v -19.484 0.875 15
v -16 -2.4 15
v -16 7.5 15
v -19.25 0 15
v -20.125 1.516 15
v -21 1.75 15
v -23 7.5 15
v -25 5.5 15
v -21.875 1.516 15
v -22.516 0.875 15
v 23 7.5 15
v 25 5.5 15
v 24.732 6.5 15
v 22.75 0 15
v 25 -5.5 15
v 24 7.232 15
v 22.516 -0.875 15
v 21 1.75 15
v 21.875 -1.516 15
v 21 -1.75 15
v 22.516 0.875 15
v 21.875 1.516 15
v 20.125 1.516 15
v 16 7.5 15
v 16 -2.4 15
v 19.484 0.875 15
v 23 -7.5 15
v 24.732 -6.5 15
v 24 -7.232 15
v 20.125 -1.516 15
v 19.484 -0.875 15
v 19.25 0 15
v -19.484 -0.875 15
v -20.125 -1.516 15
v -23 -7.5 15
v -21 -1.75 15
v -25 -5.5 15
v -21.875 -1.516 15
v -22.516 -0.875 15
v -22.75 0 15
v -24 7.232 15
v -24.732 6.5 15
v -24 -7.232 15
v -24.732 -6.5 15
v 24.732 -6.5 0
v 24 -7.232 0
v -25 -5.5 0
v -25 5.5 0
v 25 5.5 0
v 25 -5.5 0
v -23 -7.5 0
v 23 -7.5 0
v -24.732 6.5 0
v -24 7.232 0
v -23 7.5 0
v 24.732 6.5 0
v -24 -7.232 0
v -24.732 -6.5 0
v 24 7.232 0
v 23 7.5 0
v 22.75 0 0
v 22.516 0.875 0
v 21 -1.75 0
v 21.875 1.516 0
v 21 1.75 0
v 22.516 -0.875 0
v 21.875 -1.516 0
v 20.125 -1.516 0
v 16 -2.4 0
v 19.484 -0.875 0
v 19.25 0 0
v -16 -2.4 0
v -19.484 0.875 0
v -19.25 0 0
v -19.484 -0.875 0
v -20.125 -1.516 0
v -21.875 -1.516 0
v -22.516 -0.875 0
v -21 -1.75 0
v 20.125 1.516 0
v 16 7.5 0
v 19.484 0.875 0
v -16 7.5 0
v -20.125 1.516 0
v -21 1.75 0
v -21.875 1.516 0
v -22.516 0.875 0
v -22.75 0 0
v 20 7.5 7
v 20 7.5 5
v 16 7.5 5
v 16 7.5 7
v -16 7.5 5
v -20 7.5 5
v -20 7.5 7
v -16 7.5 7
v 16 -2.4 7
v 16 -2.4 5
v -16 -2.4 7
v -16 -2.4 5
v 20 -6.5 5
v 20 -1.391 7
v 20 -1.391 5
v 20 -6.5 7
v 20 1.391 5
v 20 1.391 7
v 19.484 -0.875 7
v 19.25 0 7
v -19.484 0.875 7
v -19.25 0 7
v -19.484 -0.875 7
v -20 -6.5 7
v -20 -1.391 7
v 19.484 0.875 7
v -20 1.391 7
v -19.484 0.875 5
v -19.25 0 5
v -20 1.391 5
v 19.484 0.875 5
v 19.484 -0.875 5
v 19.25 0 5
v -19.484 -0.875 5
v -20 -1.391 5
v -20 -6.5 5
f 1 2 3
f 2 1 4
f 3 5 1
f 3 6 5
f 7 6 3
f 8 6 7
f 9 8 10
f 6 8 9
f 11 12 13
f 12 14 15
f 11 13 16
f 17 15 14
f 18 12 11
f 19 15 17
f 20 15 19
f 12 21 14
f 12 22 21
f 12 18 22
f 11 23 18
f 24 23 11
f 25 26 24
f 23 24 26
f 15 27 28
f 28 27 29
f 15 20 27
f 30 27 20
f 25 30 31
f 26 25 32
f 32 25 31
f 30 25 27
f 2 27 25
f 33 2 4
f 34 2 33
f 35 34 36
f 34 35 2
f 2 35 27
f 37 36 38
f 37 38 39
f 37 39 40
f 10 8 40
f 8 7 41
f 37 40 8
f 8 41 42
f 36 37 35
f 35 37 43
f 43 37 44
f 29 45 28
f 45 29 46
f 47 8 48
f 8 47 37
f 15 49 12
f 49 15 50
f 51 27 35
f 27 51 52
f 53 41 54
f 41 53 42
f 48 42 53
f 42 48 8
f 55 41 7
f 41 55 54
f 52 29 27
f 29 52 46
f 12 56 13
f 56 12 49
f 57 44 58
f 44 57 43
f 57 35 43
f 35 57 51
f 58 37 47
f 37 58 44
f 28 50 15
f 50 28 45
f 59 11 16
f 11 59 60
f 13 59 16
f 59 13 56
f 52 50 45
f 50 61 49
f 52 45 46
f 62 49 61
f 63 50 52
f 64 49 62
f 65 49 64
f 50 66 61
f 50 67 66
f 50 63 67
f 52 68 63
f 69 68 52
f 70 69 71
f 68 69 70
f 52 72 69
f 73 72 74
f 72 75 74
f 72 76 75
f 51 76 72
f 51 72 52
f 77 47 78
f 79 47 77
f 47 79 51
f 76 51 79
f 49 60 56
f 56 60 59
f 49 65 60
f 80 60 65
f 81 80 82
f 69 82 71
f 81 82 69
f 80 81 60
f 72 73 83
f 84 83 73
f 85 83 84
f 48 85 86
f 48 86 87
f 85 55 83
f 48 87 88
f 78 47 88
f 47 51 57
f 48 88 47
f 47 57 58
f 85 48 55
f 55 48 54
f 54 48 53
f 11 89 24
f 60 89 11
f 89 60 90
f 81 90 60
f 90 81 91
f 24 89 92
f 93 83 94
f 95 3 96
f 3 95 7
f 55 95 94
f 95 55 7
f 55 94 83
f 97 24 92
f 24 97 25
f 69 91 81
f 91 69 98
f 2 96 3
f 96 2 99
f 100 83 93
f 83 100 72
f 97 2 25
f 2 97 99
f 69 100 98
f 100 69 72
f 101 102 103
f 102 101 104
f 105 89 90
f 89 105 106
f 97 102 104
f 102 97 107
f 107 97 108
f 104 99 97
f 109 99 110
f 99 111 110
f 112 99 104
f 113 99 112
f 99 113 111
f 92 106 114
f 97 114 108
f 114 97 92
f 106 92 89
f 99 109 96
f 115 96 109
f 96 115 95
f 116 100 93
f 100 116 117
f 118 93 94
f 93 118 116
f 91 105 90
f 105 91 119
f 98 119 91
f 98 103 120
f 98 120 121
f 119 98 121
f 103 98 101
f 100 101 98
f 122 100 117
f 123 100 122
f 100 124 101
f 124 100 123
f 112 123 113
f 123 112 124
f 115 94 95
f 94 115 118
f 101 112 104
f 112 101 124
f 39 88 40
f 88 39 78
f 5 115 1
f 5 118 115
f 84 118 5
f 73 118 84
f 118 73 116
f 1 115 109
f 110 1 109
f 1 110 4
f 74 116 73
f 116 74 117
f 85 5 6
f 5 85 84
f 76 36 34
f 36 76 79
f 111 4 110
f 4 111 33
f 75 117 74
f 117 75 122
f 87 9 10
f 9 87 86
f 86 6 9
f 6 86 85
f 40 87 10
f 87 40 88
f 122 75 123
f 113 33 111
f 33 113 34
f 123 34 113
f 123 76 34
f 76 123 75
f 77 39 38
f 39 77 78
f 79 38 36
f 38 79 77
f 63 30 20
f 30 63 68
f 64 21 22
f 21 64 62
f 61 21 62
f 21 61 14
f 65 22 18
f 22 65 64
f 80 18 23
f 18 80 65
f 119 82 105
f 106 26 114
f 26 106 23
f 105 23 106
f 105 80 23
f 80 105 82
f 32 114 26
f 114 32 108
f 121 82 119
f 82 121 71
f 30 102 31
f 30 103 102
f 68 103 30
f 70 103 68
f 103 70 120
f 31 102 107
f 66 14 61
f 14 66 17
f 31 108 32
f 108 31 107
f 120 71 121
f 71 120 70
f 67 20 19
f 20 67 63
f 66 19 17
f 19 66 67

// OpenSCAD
// file: ../OpenSCAD_Modules/cube_vround.scad
module cube_vround(
	size=[10,10,10],
	round_corners=[true,true,true,true],
	rounding=3,
	center_xy=false,
	center_z=false,
	attach=0,
	wall_attach=0,
	quality=2, //integer from 1 to infinity
)
{
	assert(len(size)==3);
	assert(len(round_corners)==4);
	assert(rounding>0);
	assert(rounding<=size[0]/2);
	assert(rounding<=size[1]/2);
	assert(quality>0);
	assert(attach>=0);
	assert(wall_attach>=0);
	height=size[2]+attach;
	cyl_r=rounding+wall_attach;
	cyl_mvx=size[0]/2-rounding;
	cyl_mvy=size[1]/2-rounding;
	cube_szx=size[0]/2;
	cube_szy=size[1]/2;
	cube_mvx=cube_szx/2+wall_attach;
	cube_mvy=cube_szy/2+wall_attach;
	translate([center_xy?0:cube_szx,center_xy?0:cube_szy,center_z?-attach/2:(size[2]-attach)/2])
		hull()
		{
			if(round_corners[0])
				translate([cyl_mvx,cyl_mvy])
					cylinder(r=cyl_r,h=height,$fn=12*quality,center=true);
			else
				translate([cube_mvx,cube_mvy])
					cube([cube_szx,cube_szy,height],center=true);
			if(round_corners[1])
				translate([cyl_mvx,-cyl_mvy])
					cylinder(r=cyl_r,h=height,$fn=12*quality,center=true);
			else
				translate([cube_mvx,-cube_mvy])
					cube([cube_szx,cube_szy,height],center=true);
			if(round_corners[2])
				translate([-cyl_mvx,-cyl_mvy])
					cylinder(r=cyl_r,h=height,$fn=12*quality,center=true);
			else
				translate([-cube_mvx,-cube_mvy])
					cube([cube_szx,cube_szy,height],center=true);
			if(round_corners[3])
				translate([-cyl_mvx,cyl_mvy])
					cylinder(r=cyl_r,h=height,$fn=12*quality,center=true);
			else
				translate([-cube_mvx,cube_mvy])
					cube([cube_szx,cube_szy,height],center=true);
		};
}

//example
cube_vround(round_corners=[true,false,true,false],
size=[10,20,6],
attach=0.1,
wall_attach=0.1,
rounding=3,
center_xy=true,center_z=false);
// main file
use <../OpenSCAD_Modules/cube_vround.scad>

module PowerClipsHolder
(
	size=[50,15,15],
	cutSize=[32,10],
	clipSize=[4,2],
	clipShift=8,
	screwDiam=3.5,
	screwDiff=42,
	quality=1,
)
{
	cutClr=0.1;
	length=size[0];
	width=size[1];
	height=size[2];
	difference()
	{
		cube_vround(size=[length,width,height],rounding=2,center_xy=true,quality=quality);
		//main cut
		translate([-cutSize[0]/2,(width-2*cutSize[1])/2+cutClr,-cutClr])
			cube(size=[cutSize[0],cutSize[1]+cutClr,height+2*cutClr]);
		//rear cut
		translate([-cutSize[0]/2-clipSize[0],(width-2*cutSize[1])/2-clipSize[0],height-clipSize[1]-clipShift])
			cube(size=[cutSize[0]+clipSize[0]*2,cutSize[1]+clipSize[0]+cutClr,clipSize[1]]);
		//screw cuts
		translate([-screwDiff/2,0,-cutClr])
			cylinder(h=height+2*cutClr,d=screwDiam,$fn=quality*12);
		translate([screwDiff/2,0,-cutClr])
			cylinder(h=height+2*cutClr,d=screwDiam,$fn=quality*12);
	}
//	color(c=[0,0,0])
}

PowerClipsHolder();
